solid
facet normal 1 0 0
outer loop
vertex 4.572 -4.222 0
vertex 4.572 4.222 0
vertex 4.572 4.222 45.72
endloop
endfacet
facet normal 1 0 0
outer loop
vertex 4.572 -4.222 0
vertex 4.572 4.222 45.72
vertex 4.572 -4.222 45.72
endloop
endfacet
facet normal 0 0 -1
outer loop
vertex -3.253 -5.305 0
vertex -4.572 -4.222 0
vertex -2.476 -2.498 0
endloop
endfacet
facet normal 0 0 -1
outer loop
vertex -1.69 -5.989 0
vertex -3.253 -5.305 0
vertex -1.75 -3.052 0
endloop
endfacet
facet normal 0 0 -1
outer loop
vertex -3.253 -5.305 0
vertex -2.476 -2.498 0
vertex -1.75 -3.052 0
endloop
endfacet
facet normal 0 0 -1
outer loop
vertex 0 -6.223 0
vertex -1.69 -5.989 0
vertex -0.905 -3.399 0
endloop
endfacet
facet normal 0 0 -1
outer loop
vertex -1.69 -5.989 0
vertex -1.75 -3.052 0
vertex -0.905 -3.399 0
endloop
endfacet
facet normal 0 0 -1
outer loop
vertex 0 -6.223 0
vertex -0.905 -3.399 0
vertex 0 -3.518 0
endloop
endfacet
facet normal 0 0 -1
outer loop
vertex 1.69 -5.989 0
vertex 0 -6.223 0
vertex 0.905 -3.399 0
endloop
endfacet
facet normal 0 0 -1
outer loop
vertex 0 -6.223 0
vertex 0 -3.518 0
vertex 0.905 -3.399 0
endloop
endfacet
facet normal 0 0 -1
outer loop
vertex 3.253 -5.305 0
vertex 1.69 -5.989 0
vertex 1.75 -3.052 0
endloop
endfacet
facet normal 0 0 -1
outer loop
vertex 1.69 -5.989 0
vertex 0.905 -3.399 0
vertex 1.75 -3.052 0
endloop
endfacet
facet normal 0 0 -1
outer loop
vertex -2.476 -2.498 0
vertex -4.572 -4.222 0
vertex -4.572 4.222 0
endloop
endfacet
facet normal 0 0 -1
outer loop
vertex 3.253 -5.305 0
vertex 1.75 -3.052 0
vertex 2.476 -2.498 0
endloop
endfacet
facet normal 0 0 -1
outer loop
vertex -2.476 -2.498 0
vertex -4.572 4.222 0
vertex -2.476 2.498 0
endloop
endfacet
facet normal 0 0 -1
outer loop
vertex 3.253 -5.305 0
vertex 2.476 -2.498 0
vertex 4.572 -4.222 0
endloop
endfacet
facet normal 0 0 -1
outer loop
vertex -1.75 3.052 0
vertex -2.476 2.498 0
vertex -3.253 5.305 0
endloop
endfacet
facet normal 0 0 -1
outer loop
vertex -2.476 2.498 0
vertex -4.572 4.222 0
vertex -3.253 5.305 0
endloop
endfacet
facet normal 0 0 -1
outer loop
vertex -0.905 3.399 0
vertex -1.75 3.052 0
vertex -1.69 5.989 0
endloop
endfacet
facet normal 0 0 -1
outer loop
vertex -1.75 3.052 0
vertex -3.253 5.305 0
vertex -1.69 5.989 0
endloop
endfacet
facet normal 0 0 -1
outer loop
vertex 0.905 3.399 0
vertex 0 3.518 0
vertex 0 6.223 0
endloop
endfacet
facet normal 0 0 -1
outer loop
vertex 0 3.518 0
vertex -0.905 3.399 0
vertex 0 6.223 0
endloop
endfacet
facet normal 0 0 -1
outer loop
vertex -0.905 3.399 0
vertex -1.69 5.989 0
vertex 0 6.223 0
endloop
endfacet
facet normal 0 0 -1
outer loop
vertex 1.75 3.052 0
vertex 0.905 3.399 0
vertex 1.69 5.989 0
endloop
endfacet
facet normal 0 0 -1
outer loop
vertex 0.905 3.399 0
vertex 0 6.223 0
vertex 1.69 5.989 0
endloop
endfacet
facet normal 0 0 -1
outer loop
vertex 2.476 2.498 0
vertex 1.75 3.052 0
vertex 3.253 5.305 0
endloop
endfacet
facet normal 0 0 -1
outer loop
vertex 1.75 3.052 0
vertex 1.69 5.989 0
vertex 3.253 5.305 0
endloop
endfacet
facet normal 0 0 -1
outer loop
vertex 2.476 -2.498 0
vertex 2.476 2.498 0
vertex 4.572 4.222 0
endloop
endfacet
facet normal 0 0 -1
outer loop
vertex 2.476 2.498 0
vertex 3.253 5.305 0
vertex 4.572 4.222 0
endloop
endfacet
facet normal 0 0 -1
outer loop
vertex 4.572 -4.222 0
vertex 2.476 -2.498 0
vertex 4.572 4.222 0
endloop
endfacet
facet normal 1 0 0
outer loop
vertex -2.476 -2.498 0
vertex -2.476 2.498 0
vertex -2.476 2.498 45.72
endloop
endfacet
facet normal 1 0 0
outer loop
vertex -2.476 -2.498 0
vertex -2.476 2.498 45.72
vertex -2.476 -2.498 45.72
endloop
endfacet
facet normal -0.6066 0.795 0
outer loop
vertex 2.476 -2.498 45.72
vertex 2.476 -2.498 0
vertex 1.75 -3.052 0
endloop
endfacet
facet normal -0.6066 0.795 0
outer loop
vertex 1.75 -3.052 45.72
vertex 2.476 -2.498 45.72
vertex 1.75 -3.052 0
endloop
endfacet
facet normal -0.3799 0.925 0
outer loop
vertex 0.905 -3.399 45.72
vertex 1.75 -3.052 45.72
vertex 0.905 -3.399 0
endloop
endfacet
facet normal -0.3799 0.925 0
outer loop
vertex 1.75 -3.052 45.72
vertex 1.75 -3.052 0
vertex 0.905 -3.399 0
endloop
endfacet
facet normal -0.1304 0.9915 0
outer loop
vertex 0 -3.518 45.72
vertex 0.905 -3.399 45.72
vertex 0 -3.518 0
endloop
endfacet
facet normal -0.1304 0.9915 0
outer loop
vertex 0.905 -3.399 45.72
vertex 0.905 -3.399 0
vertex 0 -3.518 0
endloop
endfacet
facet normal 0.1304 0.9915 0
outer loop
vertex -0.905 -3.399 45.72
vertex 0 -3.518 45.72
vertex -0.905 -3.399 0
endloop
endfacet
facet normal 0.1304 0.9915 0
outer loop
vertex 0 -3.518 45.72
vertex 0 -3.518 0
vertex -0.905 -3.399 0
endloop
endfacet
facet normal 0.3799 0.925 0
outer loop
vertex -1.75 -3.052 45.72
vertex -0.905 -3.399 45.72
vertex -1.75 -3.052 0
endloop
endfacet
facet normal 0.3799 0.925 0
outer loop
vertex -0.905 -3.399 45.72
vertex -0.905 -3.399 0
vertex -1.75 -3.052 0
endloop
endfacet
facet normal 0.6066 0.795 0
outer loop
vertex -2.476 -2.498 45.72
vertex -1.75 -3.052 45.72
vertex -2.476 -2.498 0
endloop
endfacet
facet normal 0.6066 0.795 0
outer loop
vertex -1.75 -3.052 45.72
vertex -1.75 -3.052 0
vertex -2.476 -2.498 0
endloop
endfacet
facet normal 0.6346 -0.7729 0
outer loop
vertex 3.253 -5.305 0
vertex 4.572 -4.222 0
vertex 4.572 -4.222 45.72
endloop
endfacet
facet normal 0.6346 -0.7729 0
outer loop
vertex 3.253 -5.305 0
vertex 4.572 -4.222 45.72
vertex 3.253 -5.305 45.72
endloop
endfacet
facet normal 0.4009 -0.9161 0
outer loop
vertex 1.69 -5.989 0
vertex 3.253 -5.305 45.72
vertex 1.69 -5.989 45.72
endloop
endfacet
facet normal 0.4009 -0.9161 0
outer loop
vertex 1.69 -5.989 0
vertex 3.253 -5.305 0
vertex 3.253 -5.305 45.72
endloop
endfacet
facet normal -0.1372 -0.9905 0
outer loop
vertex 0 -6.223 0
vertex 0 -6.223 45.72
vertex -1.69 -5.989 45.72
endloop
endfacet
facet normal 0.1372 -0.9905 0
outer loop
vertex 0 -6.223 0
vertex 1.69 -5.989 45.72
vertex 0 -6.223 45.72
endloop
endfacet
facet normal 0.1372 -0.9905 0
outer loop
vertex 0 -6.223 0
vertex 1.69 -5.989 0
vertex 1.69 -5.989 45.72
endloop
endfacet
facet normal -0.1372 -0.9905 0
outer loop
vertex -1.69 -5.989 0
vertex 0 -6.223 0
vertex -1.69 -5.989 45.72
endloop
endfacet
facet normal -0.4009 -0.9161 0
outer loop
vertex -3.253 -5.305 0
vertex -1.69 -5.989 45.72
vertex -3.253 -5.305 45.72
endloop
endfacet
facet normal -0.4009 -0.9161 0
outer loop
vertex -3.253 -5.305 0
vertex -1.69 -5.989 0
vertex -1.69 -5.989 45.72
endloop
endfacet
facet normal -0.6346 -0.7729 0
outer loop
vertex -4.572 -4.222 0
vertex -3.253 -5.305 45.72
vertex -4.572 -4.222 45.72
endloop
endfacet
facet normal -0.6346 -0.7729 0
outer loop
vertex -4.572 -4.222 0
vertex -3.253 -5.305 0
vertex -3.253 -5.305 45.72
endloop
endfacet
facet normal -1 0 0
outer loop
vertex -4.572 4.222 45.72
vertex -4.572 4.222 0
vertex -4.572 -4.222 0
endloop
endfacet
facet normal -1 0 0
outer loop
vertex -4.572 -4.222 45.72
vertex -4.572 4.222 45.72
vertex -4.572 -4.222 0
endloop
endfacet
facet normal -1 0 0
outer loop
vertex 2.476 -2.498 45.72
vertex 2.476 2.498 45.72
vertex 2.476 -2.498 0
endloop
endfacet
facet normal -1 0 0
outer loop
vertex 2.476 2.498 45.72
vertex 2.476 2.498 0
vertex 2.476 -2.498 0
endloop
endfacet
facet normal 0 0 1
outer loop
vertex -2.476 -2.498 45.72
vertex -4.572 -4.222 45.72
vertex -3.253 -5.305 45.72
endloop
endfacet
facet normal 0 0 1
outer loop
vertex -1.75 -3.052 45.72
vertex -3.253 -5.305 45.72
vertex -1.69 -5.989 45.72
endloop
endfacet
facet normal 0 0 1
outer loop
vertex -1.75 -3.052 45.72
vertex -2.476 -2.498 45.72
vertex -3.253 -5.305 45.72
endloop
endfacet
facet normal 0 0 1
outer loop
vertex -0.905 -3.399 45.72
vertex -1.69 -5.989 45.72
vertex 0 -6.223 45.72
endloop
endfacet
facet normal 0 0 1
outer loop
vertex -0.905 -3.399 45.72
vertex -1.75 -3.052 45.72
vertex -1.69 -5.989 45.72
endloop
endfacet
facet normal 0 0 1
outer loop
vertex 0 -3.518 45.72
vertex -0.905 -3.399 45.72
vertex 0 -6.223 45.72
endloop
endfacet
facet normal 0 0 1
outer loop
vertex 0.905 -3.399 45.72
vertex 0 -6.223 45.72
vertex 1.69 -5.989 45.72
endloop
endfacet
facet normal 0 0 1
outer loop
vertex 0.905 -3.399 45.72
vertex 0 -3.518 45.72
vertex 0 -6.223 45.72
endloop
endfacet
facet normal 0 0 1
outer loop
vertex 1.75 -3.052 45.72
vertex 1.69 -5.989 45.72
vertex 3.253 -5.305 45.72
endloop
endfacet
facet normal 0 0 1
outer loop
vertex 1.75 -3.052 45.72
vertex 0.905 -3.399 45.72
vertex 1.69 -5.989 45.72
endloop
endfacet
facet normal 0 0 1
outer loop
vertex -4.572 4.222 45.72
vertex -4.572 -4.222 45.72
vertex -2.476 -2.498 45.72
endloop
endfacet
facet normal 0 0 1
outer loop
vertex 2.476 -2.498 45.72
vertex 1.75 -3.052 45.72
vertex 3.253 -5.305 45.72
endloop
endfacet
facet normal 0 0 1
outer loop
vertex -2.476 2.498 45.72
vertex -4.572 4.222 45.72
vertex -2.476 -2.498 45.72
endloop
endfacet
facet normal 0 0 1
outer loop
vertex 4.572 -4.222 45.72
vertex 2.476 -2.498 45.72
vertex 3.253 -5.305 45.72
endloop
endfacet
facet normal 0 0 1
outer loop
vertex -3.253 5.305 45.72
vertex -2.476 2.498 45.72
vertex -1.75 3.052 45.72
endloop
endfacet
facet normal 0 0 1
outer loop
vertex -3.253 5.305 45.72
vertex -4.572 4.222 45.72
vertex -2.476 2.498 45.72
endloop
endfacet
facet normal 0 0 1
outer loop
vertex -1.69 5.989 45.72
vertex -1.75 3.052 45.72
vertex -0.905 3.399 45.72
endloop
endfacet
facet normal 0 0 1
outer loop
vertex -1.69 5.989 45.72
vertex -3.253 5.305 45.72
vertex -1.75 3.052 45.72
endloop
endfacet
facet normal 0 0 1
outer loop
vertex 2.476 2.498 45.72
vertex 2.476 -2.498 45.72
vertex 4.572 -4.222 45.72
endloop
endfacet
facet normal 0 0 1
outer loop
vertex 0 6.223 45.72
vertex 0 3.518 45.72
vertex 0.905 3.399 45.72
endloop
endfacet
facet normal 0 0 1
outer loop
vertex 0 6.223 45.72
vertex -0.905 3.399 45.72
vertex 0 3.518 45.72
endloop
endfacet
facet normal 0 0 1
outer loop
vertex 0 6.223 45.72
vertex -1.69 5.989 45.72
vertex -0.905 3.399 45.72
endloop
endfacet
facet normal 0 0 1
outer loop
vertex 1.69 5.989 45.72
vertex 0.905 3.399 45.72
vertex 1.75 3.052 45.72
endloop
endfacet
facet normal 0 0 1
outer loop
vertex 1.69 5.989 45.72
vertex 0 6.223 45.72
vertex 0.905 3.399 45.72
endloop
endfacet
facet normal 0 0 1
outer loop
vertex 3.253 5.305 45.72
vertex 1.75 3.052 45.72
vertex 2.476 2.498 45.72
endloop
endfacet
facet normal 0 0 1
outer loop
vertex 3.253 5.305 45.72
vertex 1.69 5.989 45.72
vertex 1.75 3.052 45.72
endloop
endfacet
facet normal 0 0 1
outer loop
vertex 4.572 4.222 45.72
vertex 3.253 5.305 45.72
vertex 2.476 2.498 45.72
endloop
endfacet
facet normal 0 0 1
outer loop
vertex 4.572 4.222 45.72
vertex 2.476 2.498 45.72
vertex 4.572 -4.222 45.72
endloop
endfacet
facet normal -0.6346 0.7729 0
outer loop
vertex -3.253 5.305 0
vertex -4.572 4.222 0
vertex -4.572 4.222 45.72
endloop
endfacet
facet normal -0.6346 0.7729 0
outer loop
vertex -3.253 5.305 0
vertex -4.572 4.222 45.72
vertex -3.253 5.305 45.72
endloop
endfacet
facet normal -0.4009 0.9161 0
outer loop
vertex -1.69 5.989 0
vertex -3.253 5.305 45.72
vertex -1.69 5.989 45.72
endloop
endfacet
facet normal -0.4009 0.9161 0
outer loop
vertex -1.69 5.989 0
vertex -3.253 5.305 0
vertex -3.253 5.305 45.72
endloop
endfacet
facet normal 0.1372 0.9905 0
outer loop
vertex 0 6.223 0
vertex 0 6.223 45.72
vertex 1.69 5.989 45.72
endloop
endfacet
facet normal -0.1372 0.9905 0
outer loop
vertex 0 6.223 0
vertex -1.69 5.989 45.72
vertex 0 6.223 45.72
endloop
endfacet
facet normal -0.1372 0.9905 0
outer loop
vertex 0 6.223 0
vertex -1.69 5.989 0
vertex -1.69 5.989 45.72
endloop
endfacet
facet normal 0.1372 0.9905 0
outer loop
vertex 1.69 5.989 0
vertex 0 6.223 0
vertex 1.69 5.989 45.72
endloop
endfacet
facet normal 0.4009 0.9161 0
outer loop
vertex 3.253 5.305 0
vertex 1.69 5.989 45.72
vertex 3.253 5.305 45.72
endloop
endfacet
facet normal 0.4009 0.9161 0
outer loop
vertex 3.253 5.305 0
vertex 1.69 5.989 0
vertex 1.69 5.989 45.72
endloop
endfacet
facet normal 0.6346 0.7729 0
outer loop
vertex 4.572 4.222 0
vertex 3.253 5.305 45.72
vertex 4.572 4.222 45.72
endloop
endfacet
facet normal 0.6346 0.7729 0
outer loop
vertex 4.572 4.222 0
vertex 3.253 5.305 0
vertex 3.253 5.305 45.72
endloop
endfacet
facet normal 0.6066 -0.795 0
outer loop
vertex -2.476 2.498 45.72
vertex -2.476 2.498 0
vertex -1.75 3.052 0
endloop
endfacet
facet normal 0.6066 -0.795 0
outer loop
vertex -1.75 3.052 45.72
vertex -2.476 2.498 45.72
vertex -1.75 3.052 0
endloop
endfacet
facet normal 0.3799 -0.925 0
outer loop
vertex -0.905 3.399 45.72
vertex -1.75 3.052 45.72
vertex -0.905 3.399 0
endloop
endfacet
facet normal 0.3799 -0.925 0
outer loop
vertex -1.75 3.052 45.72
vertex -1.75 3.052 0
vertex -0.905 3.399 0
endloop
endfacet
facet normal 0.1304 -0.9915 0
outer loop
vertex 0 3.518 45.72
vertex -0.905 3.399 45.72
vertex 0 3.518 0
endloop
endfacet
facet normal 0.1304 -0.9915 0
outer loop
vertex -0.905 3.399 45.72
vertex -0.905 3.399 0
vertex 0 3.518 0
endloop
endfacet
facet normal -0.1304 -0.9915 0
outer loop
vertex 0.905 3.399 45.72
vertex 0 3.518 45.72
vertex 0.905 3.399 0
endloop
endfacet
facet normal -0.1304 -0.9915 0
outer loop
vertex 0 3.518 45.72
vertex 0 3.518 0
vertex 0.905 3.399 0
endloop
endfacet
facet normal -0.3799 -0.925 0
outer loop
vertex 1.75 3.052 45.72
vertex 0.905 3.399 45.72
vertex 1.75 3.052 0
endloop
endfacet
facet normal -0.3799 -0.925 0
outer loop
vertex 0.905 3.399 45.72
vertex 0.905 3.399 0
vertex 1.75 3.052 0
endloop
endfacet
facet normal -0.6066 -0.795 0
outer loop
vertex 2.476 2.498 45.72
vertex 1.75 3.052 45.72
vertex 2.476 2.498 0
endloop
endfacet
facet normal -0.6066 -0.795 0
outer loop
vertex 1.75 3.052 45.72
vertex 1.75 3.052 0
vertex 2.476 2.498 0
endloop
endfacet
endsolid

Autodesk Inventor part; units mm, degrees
ref_plane "YZ Plane" through (0, 0, 0) normal (1, 0, 0) x (0, 1, 0)
ref_plane "XZ Plane" through (0, 0, 0) normal (0, 1, 0) x (-1, 0, 0)
ref_plane "XY Plane" through (0, 0, 0) normal (0, 0, 1) x (1, 0, 0)
sketch "Sketch1" plane through (0, 0, 0) normal (0, 0, 1) x (1, 0, 0)
  line L0 (2.4765, 2.4985) -> (2.4765, -2.4985)
  line L1 (-2.4765, 2.4985) -> (-2.4765, -2.4985)
  arc A0 (-2.4765, -2.4985) -> (2.4765, -2.4985) centre (0, 0) ccw
  arc A1 (2.4765, 2.4985) -> (-2.4765, 2.4985) centre (0, 0) ccw
  line L2 (4.572, 4.2217) -> (4.572, -4.2217)
  line L3 (-4.572, 4.2217) -> (-4.572, -4.2217)
  arc A2 (-4.572, -4.2217) -> (4.572, -4.2217) centre (0, 0) ccw
  arc A3 (4.572, 4.2217) -> (-4.572, 4.2217) centre (0, 0) ccw
  dimension "d2" = 2.4765
  dimension "d3" = 4.953
  dimension "d6" = 4.572
  dimension "d7" = 9.144
  dimension "d8" = 3.5179
  dimension "d9" = 3.5179
  dimension "d10" = 6.223
  dimension "d11" = 6.223
extrude "Extrusion1" add sketch "Sketch1" along normal blind 45.72
equation "\"d2\" = 0.5 * d3"
equation "\"d6\" = 0.5 * d7"
properties part number "Motor Shaft Extension"
